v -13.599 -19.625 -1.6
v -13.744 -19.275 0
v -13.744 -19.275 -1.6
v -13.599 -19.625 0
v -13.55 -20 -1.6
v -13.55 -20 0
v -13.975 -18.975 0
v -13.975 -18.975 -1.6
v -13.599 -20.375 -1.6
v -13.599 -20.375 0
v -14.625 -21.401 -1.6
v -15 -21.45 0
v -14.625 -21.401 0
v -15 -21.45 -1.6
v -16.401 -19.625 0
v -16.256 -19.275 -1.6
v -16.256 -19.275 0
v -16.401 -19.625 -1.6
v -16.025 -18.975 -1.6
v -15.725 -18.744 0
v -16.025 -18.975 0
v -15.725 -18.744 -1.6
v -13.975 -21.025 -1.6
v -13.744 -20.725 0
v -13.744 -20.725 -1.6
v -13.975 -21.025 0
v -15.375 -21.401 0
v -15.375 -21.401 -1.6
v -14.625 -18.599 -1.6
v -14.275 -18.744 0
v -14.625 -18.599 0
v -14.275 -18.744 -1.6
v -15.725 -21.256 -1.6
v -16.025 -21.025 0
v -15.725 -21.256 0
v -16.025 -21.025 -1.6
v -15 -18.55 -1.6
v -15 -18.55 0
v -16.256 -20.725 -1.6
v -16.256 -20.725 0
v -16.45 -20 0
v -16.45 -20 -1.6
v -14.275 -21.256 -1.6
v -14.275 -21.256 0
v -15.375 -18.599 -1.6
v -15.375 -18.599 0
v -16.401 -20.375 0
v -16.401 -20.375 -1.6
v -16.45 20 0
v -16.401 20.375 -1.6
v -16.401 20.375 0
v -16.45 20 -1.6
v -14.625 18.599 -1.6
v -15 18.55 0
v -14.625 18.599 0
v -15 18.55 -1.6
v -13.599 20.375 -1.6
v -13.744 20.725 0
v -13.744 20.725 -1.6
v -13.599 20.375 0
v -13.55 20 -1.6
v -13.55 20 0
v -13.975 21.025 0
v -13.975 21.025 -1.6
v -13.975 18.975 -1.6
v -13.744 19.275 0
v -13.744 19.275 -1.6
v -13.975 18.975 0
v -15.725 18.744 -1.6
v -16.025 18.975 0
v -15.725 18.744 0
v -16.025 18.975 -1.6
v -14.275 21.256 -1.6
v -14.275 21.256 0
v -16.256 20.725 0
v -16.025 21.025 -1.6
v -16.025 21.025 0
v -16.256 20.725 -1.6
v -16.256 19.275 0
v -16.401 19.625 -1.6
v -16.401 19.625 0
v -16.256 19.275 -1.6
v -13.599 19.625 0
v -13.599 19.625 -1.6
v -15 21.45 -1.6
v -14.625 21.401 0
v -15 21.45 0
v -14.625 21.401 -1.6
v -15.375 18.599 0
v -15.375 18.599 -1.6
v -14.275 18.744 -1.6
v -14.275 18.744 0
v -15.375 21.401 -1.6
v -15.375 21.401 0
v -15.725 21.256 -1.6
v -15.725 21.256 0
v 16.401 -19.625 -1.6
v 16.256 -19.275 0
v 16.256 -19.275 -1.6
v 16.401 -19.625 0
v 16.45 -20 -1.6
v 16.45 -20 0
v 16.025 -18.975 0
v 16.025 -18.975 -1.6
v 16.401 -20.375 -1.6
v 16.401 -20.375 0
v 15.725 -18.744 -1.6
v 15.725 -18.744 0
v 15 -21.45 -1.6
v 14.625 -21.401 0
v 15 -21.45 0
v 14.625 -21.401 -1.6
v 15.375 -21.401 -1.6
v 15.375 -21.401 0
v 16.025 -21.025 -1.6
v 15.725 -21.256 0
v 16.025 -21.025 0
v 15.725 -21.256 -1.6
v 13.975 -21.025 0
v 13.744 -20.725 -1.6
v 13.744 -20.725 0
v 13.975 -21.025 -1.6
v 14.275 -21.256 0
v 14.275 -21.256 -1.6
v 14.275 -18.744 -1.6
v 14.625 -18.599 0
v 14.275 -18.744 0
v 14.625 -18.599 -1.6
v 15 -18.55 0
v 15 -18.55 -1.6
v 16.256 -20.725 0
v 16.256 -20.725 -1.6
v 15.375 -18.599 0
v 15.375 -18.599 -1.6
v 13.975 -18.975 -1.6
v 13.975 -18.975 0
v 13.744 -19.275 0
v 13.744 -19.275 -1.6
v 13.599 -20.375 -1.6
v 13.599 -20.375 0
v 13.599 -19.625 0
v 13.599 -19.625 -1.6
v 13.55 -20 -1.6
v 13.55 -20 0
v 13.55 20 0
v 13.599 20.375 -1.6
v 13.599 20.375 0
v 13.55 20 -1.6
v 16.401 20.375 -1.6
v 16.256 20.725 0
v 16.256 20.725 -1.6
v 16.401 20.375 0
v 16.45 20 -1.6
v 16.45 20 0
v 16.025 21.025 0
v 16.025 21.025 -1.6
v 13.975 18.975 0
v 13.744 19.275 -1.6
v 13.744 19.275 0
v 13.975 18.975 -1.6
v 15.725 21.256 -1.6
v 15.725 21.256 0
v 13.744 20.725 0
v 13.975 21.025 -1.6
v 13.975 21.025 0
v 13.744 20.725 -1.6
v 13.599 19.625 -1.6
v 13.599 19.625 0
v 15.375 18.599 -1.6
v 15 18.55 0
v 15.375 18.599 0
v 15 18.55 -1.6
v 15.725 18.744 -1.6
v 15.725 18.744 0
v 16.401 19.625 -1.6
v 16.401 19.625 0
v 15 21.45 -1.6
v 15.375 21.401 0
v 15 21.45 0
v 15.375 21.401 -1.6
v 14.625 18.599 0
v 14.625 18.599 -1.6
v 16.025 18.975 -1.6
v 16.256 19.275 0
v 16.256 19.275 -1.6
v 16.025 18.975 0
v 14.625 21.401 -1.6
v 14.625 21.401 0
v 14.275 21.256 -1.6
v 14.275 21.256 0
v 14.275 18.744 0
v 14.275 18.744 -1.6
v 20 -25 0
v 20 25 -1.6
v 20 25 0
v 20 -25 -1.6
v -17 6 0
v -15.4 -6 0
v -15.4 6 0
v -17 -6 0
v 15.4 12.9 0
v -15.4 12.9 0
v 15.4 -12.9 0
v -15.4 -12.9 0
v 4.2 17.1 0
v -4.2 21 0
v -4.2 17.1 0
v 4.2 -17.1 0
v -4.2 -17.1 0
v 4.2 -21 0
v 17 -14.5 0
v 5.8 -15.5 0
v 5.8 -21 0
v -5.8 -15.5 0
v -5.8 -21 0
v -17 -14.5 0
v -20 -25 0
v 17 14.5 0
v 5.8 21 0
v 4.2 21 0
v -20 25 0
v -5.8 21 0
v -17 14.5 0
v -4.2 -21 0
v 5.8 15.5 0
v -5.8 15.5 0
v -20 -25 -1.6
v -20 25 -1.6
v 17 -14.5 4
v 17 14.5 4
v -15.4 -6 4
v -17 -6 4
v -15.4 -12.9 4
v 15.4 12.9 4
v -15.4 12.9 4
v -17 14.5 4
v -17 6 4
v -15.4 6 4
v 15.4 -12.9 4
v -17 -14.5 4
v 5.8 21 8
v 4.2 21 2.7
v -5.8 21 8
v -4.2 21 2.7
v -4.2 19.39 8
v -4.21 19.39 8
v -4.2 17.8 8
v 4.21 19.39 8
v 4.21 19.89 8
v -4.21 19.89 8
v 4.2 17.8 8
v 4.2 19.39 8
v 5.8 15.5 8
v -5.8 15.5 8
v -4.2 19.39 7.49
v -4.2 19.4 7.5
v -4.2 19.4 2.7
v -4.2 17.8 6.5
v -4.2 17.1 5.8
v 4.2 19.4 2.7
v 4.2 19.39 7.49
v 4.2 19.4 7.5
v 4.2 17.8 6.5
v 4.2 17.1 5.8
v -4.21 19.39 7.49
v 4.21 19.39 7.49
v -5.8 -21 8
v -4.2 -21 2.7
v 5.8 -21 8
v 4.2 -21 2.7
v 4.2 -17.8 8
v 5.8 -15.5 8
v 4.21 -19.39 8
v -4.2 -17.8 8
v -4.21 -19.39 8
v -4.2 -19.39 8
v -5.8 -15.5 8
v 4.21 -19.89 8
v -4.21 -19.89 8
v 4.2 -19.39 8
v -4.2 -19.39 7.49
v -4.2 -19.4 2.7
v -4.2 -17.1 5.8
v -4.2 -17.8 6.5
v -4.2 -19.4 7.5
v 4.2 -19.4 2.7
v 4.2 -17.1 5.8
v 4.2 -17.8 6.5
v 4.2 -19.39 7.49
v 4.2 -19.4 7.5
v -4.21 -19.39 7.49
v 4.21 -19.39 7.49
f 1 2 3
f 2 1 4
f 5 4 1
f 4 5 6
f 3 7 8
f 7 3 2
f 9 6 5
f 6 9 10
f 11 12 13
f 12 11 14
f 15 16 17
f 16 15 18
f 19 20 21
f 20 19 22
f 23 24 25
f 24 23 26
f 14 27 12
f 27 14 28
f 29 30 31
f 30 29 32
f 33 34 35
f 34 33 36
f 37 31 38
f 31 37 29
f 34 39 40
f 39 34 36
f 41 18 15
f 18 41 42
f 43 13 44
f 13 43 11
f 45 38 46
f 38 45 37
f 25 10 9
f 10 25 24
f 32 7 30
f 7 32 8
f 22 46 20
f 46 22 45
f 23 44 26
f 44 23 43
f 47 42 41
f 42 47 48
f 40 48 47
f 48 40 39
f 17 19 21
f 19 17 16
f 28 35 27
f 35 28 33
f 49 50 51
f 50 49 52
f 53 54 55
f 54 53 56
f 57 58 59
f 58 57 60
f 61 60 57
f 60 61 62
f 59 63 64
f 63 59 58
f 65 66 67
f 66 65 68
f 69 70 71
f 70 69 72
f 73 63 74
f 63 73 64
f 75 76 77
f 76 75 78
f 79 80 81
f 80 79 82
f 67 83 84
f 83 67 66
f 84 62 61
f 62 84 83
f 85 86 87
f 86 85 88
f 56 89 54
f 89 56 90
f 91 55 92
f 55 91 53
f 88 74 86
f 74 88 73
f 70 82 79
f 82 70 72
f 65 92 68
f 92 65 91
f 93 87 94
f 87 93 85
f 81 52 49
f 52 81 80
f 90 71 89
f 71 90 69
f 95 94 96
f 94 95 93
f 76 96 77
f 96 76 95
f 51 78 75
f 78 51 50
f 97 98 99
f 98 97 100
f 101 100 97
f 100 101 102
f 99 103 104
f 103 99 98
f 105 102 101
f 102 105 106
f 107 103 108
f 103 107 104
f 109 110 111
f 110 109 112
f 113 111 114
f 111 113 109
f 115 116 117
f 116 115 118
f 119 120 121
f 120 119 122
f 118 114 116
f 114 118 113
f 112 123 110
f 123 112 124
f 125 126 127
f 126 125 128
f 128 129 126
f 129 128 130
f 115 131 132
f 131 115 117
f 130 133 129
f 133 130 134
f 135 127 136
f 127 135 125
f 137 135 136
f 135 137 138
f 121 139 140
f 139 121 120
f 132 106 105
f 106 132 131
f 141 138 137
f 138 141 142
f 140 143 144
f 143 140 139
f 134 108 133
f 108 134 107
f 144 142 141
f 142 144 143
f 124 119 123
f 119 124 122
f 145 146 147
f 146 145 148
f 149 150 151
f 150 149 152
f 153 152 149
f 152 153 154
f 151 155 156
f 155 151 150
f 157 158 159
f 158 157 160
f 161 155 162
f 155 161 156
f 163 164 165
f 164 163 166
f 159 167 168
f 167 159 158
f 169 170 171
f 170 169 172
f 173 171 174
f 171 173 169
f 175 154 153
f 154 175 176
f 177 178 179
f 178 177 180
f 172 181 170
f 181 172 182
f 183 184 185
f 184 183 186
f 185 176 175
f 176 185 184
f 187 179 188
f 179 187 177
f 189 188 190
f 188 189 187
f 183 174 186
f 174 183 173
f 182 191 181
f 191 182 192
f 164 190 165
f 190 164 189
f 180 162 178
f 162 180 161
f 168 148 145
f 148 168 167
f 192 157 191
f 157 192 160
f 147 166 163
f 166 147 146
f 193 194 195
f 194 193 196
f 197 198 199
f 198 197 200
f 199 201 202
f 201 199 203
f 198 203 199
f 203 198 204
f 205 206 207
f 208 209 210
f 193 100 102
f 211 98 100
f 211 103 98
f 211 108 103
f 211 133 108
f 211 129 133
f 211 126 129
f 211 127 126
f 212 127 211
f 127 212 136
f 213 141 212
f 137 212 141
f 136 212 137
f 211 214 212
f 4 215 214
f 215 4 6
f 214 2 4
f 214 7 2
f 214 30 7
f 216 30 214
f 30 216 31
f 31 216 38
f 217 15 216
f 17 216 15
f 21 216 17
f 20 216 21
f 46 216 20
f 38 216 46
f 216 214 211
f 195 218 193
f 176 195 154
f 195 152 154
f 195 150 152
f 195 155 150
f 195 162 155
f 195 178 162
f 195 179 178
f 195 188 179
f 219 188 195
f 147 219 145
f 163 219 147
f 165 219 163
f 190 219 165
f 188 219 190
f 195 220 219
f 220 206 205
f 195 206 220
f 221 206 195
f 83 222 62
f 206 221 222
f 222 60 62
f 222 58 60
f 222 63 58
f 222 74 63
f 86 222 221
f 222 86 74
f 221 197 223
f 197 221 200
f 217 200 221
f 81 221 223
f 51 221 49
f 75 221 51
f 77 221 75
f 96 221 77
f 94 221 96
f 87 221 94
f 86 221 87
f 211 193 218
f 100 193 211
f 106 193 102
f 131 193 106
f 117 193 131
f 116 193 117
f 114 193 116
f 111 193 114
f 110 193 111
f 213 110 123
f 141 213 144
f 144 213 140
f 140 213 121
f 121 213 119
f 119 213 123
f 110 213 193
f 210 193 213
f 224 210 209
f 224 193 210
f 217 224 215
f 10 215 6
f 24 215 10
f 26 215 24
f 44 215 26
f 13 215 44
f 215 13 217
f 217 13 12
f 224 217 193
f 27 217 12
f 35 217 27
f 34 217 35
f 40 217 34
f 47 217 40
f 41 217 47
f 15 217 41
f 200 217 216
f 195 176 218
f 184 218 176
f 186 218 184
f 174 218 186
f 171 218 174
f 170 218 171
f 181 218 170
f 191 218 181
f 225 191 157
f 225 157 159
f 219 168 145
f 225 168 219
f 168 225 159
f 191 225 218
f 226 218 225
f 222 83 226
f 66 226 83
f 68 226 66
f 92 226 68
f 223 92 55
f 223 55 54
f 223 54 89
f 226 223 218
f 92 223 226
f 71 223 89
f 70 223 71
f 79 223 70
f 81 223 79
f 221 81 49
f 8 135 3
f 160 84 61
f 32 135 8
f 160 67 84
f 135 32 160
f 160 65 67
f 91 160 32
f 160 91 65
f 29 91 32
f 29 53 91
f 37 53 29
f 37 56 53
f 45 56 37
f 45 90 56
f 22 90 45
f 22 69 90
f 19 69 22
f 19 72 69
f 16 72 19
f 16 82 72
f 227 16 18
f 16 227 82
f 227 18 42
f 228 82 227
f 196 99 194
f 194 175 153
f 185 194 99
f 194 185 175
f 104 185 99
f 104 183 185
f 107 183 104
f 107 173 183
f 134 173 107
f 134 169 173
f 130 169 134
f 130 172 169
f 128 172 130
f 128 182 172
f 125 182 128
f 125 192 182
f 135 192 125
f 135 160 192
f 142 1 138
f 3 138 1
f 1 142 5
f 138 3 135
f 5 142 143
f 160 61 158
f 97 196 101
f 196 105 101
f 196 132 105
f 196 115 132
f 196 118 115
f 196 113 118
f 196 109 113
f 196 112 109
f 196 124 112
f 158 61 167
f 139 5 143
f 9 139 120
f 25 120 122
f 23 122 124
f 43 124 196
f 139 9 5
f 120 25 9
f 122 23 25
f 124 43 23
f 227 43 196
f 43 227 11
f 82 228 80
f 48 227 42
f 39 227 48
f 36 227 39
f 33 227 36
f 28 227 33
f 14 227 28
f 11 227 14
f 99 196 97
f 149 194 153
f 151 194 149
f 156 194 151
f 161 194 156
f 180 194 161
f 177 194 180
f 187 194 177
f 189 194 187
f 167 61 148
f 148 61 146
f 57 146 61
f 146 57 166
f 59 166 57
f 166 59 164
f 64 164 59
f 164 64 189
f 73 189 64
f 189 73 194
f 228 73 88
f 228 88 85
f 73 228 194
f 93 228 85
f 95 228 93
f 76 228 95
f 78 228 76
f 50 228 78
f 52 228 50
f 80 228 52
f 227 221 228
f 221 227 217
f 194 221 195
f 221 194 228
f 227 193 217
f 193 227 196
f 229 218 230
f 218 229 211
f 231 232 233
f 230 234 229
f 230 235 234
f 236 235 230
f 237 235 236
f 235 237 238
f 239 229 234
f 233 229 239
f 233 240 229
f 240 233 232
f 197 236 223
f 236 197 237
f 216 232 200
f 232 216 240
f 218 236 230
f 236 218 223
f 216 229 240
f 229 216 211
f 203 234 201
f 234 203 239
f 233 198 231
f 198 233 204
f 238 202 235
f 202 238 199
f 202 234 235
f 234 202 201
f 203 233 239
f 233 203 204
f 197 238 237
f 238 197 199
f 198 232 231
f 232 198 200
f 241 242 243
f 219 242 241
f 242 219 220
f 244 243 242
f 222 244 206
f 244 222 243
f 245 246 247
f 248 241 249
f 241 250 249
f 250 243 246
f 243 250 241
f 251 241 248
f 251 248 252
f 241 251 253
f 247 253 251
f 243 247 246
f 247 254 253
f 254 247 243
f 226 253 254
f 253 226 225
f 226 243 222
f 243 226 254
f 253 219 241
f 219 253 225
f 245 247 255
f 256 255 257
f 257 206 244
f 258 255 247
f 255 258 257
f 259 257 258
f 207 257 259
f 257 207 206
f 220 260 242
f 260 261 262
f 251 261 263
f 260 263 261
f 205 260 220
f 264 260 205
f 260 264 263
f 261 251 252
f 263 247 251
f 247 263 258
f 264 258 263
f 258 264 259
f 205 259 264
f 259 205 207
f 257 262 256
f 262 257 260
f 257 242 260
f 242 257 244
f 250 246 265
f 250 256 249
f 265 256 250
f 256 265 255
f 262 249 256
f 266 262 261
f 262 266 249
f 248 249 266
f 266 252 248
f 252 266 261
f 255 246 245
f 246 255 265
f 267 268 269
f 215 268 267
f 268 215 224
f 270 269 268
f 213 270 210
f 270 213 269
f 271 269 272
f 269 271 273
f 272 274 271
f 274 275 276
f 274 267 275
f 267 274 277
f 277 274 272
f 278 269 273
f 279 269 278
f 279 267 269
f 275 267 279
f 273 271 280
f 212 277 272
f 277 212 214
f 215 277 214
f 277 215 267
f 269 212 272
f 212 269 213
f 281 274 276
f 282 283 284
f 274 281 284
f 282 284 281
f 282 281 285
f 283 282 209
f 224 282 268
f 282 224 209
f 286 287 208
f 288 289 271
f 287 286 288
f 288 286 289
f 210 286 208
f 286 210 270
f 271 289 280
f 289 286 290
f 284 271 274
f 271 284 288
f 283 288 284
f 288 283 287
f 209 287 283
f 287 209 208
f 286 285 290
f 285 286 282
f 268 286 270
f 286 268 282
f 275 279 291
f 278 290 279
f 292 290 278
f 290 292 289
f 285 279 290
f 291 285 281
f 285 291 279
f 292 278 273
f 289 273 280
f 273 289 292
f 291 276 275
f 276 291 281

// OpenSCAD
// file: ../../screw-post/screw-post.scad
//-----------------------------------------------------------------------
// Screw post: a round post off the floor that a board screws down onto
//
// Two ways to fix:
//   "nut"  clearance hole through the post and floor; the nut sits in a hex
//          trap in the floor's underside, so the screw goes in from the top
//   "tap"  a pilot hole the screw cuts its own thread in (one or two fittings
//          in PLA/PETG); blind, the floor stays whole underneath
// and "head" for a screw up from below (head in a counterbore, nut on top).
//
// Modules, all in the same frame:
//   screwPostGhost()     the screw (and nut), for previews
//   screwPost()          the post: add to the floor
//   screwPostFloorCut()  subtract from the floor: nut trap / counterbore and hole
//
// Frame: origin on the floor top, on the post's axis. Z up; the floor is
// Z = -floorThick .. 0. Units: mm.
//
// Sizes: "M2", "M2.5", "M3". screwPostScrew(size, ...) says which screw length
// reaches, so a project can assert it has that screw in the kit.
//-----------------------------------------------------------------------

//-- [name, screw Ø, nut across flats, nut thick, head Ø, head height, tap hole, post Ø]
//-- Nuts ISO 4032; heads ISO 7380 button. Tap holes: the usual ~0.8 x Ø for plastic
screwSizes = [
  ["M2",   2.0, 4.0, 1.6, 3.5, 1.1, 1.6, 5.0],
  ["M2.5", 2.5, 5.0, 2.0, 4.4, 1.4, 2.1, 6.0],    // head 4.4: measured on the kit's M2.5 (controller base)
  ["M3",   3.0, 5.5, 2.4, 5.7, 1.65, 2.5, 7.0],
];

screwHoleClear = 0.4;     // added to the screw Ø for a clearance hole
screwNutClear  = 0.3;     // CAL: across flats, nut trap over the nut. Set by the fit piece
screwTapClear  = 0.0;     // CAL: added to the tap hole. Set by the fit piece
screwHeadClear = 0.6;     // counterbore over the head Ø

function screwSize(size) = let (i = search([size], screwSizes)[0])
  assert(i != [] && i != undef, str("unknown screw size ", size)) screwSizes[i];
function screwDia(size)    = screwSize(size)[1];
function screwNutAF(size)  = screwSize(size)[2];
function screwNutH(size)   = screwSize(size)[3];
function screwHeadDia(size)= screwSize(size)[4];
function screwHeadH(size)  = screwSize(size)[5];
function screwPostDia(size)= screwSize(size)[7];

//-- Shortest screw that fills the nut, from the top of the clamped part (h + clamp
//-- above the floor) down to the nut trap's underside. Round up to a length you have.
function screwPostScrew(size, h, floorThick, clamp = 1.6) = h + clamp + floorThick;

module screwPostGhost(size, h, floorThick, clamp = 1.6, length, how = "nut")
{
  d = screwDia(size);
  L = is_undef(length) ? screwPostScrew(size, h, floorThick, clamp) : length;
  top = h + clamp;
  if (how == "head")
  {
    %color("Silver") translate([0, 0, -floorThick]) cylinder(d = screwHeadDia(size), h = screwHeadH(size), $fn = 24);
    %color("Silver") translate([0, 0, -floorThick + screwHeadH(size)]) cylinder(d = d, h = L, $fn = 16);
  }
  else
  {
    %color("Silver") translate([0, 0, top]) cylinder(d = screwHeadDia(size), h = screwHeadH(size), $fn = 24);
    %color("Silver") translate([0, 0, top - L]) cylinder(d = d, h = L, $fn = 16);
    if (how == "nut")
      %color("DimGray") translate([0, 0, -floorThick]) rotate([0, 0, 30]) cylinder(d = screwNutAF(size)/cos(30), h = screwNutH(size), $fn = 6);
  }
}

//-- how: "nut" | "head" (through hole) or "tap" (blind pilot hole). postDia defaults by size
module screwPost(size, h, how = "nut", postDia, tapClear = screwTapClear)
{
  pd = is_undef(postDia) ? screwPostDia(size) : postDia;
  hole = how == "tap" ? screwSize(size)[6] + tapClear : screwDia(size) + screwHoleClear;
  difference()
  {
    translate([0, 0, -0.01]) cylinder(d = pd, h = h + 0.01, $fn = 40);
    translate([0, 0, how == "tap" ? 0.6 : -1]) cylinder(d = hole, h = h + 2, $fn = 24);
    //-- lead-in so the screw starts square
    translate([0, 0, h - 0.4]) cylinder(d1 = hole, d2 = hole + 0.8, h = 0.41, $fn = 24);
  }
}

//-- "nut": hex trap from the underside, opening a little over the nut so it sits flush.
//-- "head": counterbore for the head. "tap": nothing.
module screwPostFloorCut(size, floorThick, how = "nut", nutClear = screwNutClear)
{
  d = screwDia(size) + screwHoleClear;
  if (how == "nut")
  {
    af = screwNutAF(size) + nutClear;
    translate([0, 0, -floorThick - 1]) rotate([0, 0, 30]) cylinder(d = af/cos(30), h = screwNutH(size) + 0.1 + 1, $fn = 6);
    translate([0, 0, -floorThick - 1]) cylinder(d = d + 0.4, h = floorThick + 2, $fn = 24);
  }
  if (how == "head")
  {
    translate([0, 0, -floorThick - 1]) cylinder(d = screwHeadDia(size) + screwHeadClear, h = screwHeadH(size) + 0.2 + 1, $fn = 32);
    translate([0, 0, -floorThick - 1]) cylinder(d = d + 0.4, h = floorThick + 2, $fn = 24);
  }
  assert(how == "tap" || floorThick >= (how == "nut" ? screwNutH(size) : screwHeadH(size)) + 0.1 + 0.3,
         str("floor too thin for the ", size, " ", how));
}
// file: ../../lipo-cradle/lipo-cradle.scad
//-----------------------------------------------------------------------
// LiPo pouch cell, in a low open cradle on the floor
//
// A low wall round the pack's footprint, with a gap on one side for the
// lead. The pack drops in and the lid (or a strap) keeps it down. Optional
// strap bars on the two long sides take a hook-and-loop strap over the pack:
// the strap goes down outside the wall, under the bar, and back up.
//
// Modules, all in the same frame:
//   lipoGhost()    the pack, for previews
//   lipoCradle()   the plastic: wall, lead gap, optional strap bars
//   lipoBody()     the pack as a plain solid (views, collision checks)
//
// Frame: origin on the floor top, at the centre of the pack's footprint.
// X along the pack's length (the tab and lead at -X), Y across its width,
// Z up. Units: mm.
//
// Sizes: the pouch code on the label, TTWWLL = thickness in tenths of a mm,
// width, length in whole mm (602530 = 6.0 x 25 x 30). Named packs are in
// lipoPacks; lipoCodeDims("503035") decodes any other code. Codes are the
// CELL: a pack with its protection board folded at the tab end is a few mm
// longer, and pouches swell, so measure the pack and use the allowances.
//
// Use with `use <.../components/lipo-cradle/lipo-cradle.scad>`.
//-----------------------------------------------------------------------

//-- [name, thickness, width, length, note]. The cell sizes from the code, except where measured
lipoPacks = [
  ["402030",  4.0, 20, 30, ""],
  ["502030",  5.0, 20, 30, ""],
  ["602530",  6.0, 25, 30, "500 mAh in use, controller project (label read 2026-10-30)"],
  ["503035",  5.0, 30, 35, ""],
  ["403048",  4.0, 30, 48, ""],
  ["603048",  6.0, 30, 48, ""],
  ["503450",  5.0, 34, 50, ""],
  ["603450",  6.0, 34, 50, ""],
  ["103450", 10.0, 34, 50, "the 10 is whole mm: 1800-2000 mAh"],
  ["902030",  9.0, 20, 30, ""],
  ["605060",  6.0, 50, 60, ""],
  ["803860",  8.0, 38, 60, "2000 mAh class"],
  ["PKCell-2000", 8.0, 38, 60, "Pi Hut 105187, 2000 mAh, vendor size; lead 100, JST-PH"],
];

//-- decode a six-digit code: TT in tenths of a mm (20 and up), WW, LL in mm.
//-- Codes starting with 1 (10-19) are ambiguous (103450 is 10 mm thick): put them in lipoPacks
function lipoCodeDims(code) =
  let (d = [for (c = code) ord(c) - 48],
       t = d[0]*10 + d[1])
  assert(len(code) == 6 && min(d) >= 0 && max(d) <= 9, str("not a six-digit pouch code: ", code))
  assert(t >= 20, str("ambiguous thickness in ", code, ": add it to lipoPacks"))
  [t/10, d[2]*10 + d[3], d[4]*10 + d[5]];

//-- [thickness, width, length] by name, or decoded from the code
function lipoDims(name) = let (i = search([name], lipoPacks)[0])
  (i != [] && i != undef) ? [lipoPacks[i][1], lipoPacks[i][2], lipoPacks[i][3]] : lipoCodeDims(name);

lipoDefault    = "602530";

//-- The cradle
lipoClearance  = 0.4;     // each side, pack to wall (controller base fitClearance). CAL by the fit piece
lipoWall       = 1.6;
lipoWallH      = 4;       // above the floor (controller base: 4 for a 6 thick pack)
lipoLeadGap    = 12;      // gap in the wall for the lead (controller base: 12)
lipoPcmAllow   = 0;       // added to the length at the tab end, for a protection board past the cell: CAL
lipoSwell      = 0.10;    // allow 10 % on the thickness for a pouch swelling with age
lipoTopGap     = 0.5;     // above the swollen pack, under the lid
//-- strap bars: off unless strap > 0 (the strap's width)
lipoStrapGap   = 2.0;     // wall to bar, and floor to bar: room for the strap
lipoStrapBar   = 2.0;     // bar thickness (Y) and height (Z)
lipoStrapPost  = 2.0;     // posts each end of the bar

//-- headroom over the floor the lid must clear
function lipoHeadroom(name = lipoDefault, swell = lipoSwell) = lipoDims(name)[0]*(1 + swell) + lipoTopGap;

module lipoBody(name = lipoDefault, pcm = lipoPcmAllow)
{
  d = lipoDims(name);
  translate([-d[2]/2 - pcm, -d[1]/2, 0]) cube([d[2] + pcm, d[1], d[0]]);
}

module lipoGhost(name = lipoDefault, pcm = lipoPcmAllow)
{
  d = lipoDims(name);
  %color("Silver") lipoBody(name, pcm);
  //-- the lead, out of the tab end
  for (s = [-1, 1])
    %color(s < 0 ? "Black" : "Red") translate([-d[2]/2 - pcm - 15, s*1.2 - 0.6, d[0]/2 - 0.6]) cube([15, 1.2, 1.2]);
}

//-- leadSide: "-x" (default, the tab end), "+x", "-y", "+y". strap: strap width, 0 for none
module lipoCradle(name = lipoDefault, clearance = lipoClearance, h = lipoWallH, leadSide = "-x",
                  gap = lipoLeadGap, pcm = lipoPcmAllow, strap = 0)
{
  d = lipoDims(name);
  lx = d[2] + pcm; ly = d[1];
  x0 = -d[2]/2 - pcm;                                    // pack's -X end
  c = clearance; w = lipoWall;
  assert(gap < min(lx, ly) - 2, "lead gap wider than the side it's in");
  translate([0, 0, -0.01])
    difference()
    {
      translate([x0 - c - w, -ly/2 - c - w, 0]) cube([lx + 2*(c + w), ly + 2*(c + w), h + 0.01]);
      translate([x0 - c, -ly/2 - c, -1]) cube([lx + 2*c, ly + 2*c, h + 2]);
      //-- lead gap, centred on its side
      if (leadSide == "-x") translate([x0 - c - w - 1, -gap/2, -1]) cube([w + 2, gap, h + 2]);
      if (leadSide == "+x") translate([x0 + lx + c - 1, -gap/2, -1]) cube([w + 2, gap, h + 2]);
      if (leadSide == "-y") translate([x0 + lx/2 - gap/2, -ly/2 - c - w - 1, -1]) cube([gap, w + 2, h + 2]);
      if (leadSide == "+y") translate([x0 + lx/2 - gap/2, ly/2 + c - 1, -1]) cube([gap, w + 2, h + 2]);
    }
  //-- strap bars on the long sides, across the middle of the pack
  if (strap > 0)
    for (m = [0, 1])
      mirror([0, m, 0])
        translate([x0 + lx/2, ly/2 + c + w + lipoStrapGap, -0.01])
          difference()
          {
            translate([-strap/2 - 0.5 - lipoStrapPost, 0, 0])
              cube([strap + 1 + 2*lipoStrapPost, lipoStrapBar, lipoStrapGap + lipoStrapBar + 0.01]);
            translate([-strap/2 - 0.5, -1, -1]) cube([strap + 1, lipoStrapBar + 2, lipoStrapGap + 1.01]);
          }
}
// main file
// The posts on a 4 x 5 carrier, either side of a 602530 pack's cradle, for the catalogue.
// The bridge frame is turned 90 deg so the bar crosses the pack's width; the cradle's lead
// gap stays clear at the carrier's -X end.
use <../bridge.scad>
use <../../carrier/carrier.scad>
use <../../lipo-cradle/lipo-cradle.scad>

pack = "602530";
over = 25 + 2*(0.4 + 1.6);    // the cradle's outside across the pack: 29
span = brSpanFor(over);       // 36.5: 1 clear each side of the cradle
h    = brBarZ(6.0);           // 8: the pack is 6 thick, under 3 foam squashed by 1

carrierPlate(4, 5, open = false);
lipoCradle(pack);
rotate([0, 0, 90]) bridgePosts(span, h);
